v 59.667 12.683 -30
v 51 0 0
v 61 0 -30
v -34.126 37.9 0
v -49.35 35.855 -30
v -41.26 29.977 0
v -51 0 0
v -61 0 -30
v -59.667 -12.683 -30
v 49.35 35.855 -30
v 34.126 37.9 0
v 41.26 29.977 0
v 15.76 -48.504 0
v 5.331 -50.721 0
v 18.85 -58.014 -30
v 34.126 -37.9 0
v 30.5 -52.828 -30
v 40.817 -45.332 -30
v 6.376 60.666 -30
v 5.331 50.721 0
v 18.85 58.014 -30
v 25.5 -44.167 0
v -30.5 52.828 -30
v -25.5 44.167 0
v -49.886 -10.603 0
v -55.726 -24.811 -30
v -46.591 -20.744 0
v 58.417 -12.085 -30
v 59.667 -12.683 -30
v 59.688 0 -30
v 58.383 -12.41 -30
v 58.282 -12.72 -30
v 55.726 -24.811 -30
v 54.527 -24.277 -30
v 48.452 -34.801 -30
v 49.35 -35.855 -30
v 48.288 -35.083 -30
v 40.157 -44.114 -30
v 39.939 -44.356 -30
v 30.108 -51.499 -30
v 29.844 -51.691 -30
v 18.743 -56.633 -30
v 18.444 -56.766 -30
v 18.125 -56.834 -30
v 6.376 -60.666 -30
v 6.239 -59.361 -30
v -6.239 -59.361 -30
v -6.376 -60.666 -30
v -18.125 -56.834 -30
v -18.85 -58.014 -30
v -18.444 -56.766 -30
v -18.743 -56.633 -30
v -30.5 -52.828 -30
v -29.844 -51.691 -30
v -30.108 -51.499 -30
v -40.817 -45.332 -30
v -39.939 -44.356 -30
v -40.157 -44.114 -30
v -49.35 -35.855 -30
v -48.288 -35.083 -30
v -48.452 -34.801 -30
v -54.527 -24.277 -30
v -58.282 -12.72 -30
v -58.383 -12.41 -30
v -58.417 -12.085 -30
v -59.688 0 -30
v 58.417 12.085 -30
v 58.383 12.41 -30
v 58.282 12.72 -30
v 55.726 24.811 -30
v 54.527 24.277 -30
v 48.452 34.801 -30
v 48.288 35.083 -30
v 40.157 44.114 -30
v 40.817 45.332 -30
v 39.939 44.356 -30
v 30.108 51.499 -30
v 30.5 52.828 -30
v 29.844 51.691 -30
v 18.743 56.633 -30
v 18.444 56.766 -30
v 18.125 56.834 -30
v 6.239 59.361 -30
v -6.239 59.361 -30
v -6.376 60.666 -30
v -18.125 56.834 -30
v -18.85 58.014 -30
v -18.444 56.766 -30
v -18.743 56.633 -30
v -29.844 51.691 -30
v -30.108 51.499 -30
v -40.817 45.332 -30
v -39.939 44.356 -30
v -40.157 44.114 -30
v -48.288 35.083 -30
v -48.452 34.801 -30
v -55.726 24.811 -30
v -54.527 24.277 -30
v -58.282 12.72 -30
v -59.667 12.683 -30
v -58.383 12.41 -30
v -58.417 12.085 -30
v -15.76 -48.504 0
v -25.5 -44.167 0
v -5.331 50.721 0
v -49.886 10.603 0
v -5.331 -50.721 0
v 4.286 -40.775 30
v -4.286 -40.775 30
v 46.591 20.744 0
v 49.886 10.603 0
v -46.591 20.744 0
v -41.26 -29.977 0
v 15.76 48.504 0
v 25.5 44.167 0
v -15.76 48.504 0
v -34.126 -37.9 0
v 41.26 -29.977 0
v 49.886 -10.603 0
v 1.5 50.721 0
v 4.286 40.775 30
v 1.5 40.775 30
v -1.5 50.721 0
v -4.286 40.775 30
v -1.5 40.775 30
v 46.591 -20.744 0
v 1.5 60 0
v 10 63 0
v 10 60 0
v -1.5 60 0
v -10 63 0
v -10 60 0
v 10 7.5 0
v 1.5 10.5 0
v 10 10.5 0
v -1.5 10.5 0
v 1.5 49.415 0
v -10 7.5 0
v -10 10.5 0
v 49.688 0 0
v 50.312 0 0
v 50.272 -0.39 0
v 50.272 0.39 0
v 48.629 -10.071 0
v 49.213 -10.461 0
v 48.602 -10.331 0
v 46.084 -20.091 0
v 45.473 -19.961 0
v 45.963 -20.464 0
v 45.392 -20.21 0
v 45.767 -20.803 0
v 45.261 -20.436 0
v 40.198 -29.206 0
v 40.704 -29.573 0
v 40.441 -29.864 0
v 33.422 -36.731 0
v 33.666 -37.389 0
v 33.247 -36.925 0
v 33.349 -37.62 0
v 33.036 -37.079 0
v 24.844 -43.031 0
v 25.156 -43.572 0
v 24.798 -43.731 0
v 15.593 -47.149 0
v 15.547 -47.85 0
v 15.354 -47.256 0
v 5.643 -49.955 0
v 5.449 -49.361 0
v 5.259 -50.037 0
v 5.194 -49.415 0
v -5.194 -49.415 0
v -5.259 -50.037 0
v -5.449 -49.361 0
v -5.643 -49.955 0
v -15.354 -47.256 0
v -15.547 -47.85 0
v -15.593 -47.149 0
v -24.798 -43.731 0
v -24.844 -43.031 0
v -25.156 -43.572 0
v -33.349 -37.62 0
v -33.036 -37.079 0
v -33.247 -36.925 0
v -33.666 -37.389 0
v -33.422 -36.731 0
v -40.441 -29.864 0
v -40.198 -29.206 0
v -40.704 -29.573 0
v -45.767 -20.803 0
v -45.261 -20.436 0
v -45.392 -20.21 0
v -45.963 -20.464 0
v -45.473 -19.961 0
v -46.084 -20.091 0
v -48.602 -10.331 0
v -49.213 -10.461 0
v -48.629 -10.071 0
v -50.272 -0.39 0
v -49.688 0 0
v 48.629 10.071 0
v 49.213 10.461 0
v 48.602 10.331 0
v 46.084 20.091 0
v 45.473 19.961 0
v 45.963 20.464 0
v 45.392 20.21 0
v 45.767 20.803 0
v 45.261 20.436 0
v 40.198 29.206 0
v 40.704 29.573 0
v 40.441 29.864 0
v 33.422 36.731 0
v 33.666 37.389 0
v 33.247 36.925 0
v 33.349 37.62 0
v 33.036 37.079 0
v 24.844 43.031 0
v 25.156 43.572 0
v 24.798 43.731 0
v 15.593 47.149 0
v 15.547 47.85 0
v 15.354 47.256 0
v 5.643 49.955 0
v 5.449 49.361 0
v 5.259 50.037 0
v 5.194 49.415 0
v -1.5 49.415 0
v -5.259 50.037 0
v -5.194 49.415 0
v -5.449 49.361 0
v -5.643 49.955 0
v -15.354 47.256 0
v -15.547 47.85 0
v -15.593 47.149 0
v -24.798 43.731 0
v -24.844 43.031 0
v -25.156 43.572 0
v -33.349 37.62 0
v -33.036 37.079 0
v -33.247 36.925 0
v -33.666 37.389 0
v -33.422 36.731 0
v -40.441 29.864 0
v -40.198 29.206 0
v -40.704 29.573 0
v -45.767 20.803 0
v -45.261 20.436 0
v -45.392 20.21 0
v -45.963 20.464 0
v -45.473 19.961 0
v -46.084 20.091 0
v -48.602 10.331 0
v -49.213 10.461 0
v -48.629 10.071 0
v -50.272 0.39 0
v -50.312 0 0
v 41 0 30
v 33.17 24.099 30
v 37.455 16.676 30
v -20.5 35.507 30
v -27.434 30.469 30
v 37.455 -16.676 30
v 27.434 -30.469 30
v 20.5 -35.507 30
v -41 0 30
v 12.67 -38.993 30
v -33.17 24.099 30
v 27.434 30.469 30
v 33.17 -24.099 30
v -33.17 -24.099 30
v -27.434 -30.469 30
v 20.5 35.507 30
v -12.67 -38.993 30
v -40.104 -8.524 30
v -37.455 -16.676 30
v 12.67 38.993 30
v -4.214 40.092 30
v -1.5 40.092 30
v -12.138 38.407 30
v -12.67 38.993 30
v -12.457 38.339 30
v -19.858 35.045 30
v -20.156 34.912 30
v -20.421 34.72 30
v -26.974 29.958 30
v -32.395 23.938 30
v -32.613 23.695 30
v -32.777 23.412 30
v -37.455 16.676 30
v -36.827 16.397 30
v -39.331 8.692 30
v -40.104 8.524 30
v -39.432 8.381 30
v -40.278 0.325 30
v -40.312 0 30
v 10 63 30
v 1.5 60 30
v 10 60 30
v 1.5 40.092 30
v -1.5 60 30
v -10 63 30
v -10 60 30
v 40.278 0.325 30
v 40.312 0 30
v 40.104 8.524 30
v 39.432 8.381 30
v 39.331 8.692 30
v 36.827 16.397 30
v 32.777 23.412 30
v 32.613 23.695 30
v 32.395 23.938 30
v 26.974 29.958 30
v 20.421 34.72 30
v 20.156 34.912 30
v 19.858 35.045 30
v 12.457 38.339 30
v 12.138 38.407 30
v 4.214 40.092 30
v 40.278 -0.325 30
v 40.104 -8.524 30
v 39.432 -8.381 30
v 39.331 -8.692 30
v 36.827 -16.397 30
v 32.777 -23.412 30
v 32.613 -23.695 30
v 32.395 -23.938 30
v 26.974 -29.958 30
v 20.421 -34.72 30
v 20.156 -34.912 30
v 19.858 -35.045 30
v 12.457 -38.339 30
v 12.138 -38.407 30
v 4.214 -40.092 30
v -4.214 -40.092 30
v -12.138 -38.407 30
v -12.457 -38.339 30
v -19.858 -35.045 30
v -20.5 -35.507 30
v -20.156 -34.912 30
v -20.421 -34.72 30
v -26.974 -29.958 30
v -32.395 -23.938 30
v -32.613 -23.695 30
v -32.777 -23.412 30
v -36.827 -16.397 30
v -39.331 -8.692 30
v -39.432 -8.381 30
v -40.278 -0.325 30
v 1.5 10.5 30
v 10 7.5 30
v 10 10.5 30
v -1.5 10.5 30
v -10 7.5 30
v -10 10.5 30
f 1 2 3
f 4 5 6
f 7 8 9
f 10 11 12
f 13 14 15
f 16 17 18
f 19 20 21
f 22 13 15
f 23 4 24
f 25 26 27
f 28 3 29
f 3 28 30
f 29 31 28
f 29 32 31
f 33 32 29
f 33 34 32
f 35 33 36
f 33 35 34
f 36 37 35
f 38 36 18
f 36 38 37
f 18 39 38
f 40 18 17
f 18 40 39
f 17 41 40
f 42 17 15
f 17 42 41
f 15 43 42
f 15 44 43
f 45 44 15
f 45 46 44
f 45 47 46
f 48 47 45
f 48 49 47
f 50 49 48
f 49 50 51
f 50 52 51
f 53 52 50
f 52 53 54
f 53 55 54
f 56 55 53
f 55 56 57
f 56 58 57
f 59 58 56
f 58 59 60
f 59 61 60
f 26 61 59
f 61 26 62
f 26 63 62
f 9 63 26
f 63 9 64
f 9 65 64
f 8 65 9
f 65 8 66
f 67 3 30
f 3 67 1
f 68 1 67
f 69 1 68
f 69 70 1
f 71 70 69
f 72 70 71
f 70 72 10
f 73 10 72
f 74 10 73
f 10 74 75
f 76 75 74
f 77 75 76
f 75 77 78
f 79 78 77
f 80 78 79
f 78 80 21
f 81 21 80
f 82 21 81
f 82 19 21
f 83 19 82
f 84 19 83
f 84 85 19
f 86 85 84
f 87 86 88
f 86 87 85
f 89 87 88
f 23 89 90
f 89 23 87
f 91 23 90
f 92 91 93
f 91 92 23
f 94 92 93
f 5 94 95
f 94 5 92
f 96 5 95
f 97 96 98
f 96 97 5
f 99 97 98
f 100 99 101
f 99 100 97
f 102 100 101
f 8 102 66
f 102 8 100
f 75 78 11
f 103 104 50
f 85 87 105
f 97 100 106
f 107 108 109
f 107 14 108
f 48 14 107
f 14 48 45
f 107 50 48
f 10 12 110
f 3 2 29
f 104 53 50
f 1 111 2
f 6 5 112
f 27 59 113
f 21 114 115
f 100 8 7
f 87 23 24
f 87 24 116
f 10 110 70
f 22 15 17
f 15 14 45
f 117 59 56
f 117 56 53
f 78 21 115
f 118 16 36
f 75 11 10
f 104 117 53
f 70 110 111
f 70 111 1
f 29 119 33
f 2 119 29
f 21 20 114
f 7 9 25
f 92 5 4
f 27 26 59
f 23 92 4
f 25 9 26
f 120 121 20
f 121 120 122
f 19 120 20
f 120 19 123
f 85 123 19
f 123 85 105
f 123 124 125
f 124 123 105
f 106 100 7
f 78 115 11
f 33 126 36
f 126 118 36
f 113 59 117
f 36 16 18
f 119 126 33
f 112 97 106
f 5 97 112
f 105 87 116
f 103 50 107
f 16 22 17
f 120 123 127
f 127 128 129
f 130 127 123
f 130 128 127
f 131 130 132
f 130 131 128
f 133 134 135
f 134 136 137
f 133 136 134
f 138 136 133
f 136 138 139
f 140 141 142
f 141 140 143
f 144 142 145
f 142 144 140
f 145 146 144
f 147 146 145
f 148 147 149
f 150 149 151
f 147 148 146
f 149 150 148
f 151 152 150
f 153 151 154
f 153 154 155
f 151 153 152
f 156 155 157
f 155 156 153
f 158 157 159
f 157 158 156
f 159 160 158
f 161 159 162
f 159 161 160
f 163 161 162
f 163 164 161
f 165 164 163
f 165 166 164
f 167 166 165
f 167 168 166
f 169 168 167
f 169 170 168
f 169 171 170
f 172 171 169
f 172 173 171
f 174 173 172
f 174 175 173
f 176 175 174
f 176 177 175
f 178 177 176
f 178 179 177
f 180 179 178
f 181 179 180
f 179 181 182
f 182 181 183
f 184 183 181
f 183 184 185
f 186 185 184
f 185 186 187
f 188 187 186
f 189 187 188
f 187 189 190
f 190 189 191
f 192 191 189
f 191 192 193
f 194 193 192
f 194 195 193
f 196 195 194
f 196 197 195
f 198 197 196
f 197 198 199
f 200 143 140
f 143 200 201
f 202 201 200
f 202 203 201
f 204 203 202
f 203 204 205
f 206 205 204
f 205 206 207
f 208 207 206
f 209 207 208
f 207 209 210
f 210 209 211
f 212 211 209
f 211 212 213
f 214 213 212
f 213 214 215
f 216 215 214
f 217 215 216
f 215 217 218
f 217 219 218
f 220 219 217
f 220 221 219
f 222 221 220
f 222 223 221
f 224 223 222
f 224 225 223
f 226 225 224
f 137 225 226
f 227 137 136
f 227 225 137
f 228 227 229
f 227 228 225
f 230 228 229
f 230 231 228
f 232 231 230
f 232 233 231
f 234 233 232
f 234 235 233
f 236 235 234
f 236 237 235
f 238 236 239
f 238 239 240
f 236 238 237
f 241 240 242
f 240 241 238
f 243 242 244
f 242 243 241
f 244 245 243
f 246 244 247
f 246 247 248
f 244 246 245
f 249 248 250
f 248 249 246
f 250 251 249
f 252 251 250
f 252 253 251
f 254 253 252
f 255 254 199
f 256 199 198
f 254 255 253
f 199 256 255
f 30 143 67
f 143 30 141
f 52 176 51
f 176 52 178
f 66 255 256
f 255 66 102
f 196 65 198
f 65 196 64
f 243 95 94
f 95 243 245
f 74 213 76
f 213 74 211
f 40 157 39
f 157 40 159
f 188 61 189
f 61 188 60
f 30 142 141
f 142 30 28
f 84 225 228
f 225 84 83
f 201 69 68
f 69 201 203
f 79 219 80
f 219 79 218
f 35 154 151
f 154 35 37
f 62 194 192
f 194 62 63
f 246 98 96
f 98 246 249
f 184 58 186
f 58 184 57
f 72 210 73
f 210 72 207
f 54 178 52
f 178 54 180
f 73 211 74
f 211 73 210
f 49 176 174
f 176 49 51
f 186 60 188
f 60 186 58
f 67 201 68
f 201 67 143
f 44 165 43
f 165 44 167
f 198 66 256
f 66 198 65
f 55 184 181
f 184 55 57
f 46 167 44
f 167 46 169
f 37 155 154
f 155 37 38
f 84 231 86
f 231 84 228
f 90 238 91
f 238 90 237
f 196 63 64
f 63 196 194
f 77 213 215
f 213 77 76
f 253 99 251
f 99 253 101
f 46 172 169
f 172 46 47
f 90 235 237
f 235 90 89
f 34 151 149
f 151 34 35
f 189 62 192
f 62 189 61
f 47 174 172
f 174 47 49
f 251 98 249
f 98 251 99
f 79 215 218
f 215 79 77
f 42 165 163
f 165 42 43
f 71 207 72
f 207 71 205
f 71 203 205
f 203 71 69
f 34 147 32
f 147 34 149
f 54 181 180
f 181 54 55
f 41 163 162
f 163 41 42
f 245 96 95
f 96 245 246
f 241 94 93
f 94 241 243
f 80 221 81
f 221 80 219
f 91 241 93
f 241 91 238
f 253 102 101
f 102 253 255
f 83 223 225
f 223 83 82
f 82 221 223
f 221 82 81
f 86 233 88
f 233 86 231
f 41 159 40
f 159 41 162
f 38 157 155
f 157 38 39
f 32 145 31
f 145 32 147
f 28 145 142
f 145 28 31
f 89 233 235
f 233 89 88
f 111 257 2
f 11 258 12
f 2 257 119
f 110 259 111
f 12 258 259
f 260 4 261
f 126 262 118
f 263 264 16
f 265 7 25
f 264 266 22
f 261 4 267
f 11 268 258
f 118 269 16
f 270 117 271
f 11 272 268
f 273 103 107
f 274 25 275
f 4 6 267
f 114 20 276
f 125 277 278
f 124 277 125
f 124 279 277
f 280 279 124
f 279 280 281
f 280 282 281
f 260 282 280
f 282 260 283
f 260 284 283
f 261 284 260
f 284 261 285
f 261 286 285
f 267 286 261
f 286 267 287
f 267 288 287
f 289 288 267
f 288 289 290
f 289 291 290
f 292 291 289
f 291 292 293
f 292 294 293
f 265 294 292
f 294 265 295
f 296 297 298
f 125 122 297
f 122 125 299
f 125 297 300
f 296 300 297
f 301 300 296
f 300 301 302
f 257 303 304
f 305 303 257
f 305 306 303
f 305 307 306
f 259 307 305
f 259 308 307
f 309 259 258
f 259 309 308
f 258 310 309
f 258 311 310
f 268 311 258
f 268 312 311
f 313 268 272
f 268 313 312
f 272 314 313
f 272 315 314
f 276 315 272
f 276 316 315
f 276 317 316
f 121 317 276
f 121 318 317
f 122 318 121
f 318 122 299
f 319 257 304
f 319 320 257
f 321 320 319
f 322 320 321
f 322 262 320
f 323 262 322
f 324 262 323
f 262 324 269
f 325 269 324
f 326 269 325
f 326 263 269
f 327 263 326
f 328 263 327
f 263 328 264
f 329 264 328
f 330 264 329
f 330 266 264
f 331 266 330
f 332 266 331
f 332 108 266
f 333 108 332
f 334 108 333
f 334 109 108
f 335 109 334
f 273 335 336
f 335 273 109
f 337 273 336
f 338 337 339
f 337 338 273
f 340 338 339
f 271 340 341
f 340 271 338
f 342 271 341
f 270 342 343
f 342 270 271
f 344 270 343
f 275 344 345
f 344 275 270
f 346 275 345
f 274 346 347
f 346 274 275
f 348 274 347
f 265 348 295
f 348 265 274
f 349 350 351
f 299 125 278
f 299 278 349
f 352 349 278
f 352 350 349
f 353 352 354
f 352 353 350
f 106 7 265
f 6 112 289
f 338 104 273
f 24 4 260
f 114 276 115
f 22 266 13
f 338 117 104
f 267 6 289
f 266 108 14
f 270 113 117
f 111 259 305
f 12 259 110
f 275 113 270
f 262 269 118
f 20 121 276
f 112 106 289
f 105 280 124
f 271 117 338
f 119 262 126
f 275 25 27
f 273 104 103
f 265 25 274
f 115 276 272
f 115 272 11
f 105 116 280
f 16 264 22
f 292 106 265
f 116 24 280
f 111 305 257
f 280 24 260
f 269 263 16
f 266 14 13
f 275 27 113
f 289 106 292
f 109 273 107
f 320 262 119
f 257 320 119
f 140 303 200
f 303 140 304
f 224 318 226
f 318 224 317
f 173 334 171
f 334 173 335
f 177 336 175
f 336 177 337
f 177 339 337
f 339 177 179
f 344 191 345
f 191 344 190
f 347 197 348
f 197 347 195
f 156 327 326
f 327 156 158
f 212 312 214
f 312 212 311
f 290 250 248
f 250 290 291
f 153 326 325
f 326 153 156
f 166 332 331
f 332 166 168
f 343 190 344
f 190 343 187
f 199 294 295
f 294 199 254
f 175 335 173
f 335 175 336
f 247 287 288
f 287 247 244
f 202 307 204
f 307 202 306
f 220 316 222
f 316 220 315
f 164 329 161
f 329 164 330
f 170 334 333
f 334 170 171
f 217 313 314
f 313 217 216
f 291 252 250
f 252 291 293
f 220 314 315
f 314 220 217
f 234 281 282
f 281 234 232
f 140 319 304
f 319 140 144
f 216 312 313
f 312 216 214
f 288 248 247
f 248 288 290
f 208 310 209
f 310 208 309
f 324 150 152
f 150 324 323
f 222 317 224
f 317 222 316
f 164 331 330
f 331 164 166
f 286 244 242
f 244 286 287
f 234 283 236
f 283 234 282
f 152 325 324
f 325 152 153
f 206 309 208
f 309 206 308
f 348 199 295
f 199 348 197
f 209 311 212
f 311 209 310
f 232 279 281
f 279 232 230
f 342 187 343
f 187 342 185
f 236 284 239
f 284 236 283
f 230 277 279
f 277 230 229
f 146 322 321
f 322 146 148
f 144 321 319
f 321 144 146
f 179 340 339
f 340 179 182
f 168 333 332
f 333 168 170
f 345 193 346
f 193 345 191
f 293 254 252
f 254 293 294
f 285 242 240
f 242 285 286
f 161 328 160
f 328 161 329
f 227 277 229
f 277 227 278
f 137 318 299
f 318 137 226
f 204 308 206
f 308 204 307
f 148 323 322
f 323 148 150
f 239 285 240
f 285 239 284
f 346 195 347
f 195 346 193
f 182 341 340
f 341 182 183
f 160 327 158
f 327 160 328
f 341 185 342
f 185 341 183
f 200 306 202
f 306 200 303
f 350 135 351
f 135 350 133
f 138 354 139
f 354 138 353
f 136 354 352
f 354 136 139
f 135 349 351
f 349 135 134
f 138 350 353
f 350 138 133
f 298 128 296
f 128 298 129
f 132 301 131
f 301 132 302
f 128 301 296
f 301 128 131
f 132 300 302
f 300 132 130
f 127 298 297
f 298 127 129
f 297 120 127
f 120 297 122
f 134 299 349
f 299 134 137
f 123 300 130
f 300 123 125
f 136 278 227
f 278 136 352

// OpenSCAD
r_front = 60;
r_middle = 50;
r_back = 40;
h_front = 30;
h_back = 30;
thinckness = 1;

plate_thinckness = 3;
motor_width = 20;
motor_height = 15;

//front
translate([0,0,-h_front/2]) {
    difference() {
     cylinder(h = h_front, r1 = r_front+thinckness, r2 = r_middle+thinckness, center = true);
        cylinder(h = h_front+2, r1 = r_front, r2 = r_middle, center = true);
    }
}

//back
translate([0,0,h_back/2]) {
    difference() {
        cylinder(h = h_back, r1 = r_middle+thinckness, r2 = r_back+thinckness, center = true);
        cylinder(h = h_back+2, r1 = r_middle, r2 = r_back, center = true);
    }
}

translate([0,plate_thinckness/2+motor_height/2,h_back/2]) {
    cube([motor_width,plate_thinckness,h_back],center=true);
}

translate([0,plate_thinckness/2+r_front,h_back/2]) {
    cube([motor_width,plate_thinckness,h_back],center=true);
}

translate([0,r_front-(r_front-motor_height/2-plate_thinckness/2)/2,h_back/2]) {
    cube([plate_thinckness,r_front-motor_height/2-plate_thinckness/2,h_back],center=true);
}
